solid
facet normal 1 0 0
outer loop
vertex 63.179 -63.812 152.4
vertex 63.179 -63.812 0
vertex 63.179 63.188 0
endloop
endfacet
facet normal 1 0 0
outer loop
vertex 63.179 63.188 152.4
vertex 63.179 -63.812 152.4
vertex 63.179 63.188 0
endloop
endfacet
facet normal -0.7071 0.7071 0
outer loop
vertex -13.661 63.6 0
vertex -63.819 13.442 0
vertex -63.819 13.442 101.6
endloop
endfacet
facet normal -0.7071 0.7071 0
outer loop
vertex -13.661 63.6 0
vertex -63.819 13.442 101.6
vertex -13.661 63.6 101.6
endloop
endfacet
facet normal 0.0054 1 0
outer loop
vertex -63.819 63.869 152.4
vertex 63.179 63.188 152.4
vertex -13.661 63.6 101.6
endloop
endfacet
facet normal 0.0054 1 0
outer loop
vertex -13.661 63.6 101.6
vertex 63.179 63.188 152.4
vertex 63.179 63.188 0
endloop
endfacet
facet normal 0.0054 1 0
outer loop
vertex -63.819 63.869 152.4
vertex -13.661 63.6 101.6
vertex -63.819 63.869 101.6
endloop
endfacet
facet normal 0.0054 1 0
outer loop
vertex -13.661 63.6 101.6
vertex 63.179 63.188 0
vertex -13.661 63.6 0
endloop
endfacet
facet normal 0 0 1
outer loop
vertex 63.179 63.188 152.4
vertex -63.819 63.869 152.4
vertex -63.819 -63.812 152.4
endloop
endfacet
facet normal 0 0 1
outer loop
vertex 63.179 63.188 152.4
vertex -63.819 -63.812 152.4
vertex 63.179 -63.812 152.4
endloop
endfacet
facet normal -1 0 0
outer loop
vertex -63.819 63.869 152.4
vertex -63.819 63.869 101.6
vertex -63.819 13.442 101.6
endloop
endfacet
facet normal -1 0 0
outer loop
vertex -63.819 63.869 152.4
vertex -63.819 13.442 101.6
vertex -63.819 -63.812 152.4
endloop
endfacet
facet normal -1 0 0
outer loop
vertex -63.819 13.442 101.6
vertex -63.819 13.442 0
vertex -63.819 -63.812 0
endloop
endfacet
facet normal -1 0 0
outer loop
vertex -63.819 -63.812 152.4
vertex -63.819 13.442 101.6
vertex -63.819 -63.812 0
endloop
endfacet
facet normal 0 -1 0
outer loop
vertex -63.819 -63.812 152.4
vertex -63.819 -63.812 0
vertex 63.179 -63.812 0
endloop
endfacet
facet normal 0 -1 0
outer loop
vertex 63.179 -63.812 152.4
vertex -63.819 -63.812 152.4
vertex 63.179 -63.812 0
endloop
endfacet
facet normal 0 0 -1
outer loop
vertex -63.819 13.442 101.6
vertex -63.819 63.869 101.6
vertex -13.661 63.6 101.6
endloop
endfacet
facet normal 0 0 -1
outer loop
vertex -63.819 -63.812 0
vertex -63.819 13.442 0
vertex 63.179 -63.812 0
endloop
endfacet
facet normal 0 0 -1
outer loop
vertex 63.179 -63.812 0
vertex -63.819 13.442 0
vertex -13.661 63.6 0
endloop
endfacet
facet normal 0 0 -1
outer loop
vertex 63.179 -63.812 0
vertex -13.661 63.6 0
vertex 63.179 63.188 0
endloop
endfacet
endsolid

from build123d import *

# Parameters (mm, degrees)
F2_DEPTH = 152.4
F3_DEPTH = 101.6


with BuildPart() as f2:
    # F0 (on Top) → F2 (new body)
    with BuildSketch(Plane.XY):
        Polygon((63.179306, 63.188269), (-63.818872, 63.868547), (-63.818872, -63.811731), (63.179306, -63.811731), align=None)
    extrude(amount=F2_DEPTH)

    # F1 (on face) → F3 (cut)
    with BuildSketch(Plane.XY):
        Polygon((-13.281766, 63.979113), (-64.081766, 63.979113), (-64.081766, 13.179113), align=None)
    extrude(amount=F3_DEPTH, mode=Mode.SUBTRACT)


solid = f2.part
